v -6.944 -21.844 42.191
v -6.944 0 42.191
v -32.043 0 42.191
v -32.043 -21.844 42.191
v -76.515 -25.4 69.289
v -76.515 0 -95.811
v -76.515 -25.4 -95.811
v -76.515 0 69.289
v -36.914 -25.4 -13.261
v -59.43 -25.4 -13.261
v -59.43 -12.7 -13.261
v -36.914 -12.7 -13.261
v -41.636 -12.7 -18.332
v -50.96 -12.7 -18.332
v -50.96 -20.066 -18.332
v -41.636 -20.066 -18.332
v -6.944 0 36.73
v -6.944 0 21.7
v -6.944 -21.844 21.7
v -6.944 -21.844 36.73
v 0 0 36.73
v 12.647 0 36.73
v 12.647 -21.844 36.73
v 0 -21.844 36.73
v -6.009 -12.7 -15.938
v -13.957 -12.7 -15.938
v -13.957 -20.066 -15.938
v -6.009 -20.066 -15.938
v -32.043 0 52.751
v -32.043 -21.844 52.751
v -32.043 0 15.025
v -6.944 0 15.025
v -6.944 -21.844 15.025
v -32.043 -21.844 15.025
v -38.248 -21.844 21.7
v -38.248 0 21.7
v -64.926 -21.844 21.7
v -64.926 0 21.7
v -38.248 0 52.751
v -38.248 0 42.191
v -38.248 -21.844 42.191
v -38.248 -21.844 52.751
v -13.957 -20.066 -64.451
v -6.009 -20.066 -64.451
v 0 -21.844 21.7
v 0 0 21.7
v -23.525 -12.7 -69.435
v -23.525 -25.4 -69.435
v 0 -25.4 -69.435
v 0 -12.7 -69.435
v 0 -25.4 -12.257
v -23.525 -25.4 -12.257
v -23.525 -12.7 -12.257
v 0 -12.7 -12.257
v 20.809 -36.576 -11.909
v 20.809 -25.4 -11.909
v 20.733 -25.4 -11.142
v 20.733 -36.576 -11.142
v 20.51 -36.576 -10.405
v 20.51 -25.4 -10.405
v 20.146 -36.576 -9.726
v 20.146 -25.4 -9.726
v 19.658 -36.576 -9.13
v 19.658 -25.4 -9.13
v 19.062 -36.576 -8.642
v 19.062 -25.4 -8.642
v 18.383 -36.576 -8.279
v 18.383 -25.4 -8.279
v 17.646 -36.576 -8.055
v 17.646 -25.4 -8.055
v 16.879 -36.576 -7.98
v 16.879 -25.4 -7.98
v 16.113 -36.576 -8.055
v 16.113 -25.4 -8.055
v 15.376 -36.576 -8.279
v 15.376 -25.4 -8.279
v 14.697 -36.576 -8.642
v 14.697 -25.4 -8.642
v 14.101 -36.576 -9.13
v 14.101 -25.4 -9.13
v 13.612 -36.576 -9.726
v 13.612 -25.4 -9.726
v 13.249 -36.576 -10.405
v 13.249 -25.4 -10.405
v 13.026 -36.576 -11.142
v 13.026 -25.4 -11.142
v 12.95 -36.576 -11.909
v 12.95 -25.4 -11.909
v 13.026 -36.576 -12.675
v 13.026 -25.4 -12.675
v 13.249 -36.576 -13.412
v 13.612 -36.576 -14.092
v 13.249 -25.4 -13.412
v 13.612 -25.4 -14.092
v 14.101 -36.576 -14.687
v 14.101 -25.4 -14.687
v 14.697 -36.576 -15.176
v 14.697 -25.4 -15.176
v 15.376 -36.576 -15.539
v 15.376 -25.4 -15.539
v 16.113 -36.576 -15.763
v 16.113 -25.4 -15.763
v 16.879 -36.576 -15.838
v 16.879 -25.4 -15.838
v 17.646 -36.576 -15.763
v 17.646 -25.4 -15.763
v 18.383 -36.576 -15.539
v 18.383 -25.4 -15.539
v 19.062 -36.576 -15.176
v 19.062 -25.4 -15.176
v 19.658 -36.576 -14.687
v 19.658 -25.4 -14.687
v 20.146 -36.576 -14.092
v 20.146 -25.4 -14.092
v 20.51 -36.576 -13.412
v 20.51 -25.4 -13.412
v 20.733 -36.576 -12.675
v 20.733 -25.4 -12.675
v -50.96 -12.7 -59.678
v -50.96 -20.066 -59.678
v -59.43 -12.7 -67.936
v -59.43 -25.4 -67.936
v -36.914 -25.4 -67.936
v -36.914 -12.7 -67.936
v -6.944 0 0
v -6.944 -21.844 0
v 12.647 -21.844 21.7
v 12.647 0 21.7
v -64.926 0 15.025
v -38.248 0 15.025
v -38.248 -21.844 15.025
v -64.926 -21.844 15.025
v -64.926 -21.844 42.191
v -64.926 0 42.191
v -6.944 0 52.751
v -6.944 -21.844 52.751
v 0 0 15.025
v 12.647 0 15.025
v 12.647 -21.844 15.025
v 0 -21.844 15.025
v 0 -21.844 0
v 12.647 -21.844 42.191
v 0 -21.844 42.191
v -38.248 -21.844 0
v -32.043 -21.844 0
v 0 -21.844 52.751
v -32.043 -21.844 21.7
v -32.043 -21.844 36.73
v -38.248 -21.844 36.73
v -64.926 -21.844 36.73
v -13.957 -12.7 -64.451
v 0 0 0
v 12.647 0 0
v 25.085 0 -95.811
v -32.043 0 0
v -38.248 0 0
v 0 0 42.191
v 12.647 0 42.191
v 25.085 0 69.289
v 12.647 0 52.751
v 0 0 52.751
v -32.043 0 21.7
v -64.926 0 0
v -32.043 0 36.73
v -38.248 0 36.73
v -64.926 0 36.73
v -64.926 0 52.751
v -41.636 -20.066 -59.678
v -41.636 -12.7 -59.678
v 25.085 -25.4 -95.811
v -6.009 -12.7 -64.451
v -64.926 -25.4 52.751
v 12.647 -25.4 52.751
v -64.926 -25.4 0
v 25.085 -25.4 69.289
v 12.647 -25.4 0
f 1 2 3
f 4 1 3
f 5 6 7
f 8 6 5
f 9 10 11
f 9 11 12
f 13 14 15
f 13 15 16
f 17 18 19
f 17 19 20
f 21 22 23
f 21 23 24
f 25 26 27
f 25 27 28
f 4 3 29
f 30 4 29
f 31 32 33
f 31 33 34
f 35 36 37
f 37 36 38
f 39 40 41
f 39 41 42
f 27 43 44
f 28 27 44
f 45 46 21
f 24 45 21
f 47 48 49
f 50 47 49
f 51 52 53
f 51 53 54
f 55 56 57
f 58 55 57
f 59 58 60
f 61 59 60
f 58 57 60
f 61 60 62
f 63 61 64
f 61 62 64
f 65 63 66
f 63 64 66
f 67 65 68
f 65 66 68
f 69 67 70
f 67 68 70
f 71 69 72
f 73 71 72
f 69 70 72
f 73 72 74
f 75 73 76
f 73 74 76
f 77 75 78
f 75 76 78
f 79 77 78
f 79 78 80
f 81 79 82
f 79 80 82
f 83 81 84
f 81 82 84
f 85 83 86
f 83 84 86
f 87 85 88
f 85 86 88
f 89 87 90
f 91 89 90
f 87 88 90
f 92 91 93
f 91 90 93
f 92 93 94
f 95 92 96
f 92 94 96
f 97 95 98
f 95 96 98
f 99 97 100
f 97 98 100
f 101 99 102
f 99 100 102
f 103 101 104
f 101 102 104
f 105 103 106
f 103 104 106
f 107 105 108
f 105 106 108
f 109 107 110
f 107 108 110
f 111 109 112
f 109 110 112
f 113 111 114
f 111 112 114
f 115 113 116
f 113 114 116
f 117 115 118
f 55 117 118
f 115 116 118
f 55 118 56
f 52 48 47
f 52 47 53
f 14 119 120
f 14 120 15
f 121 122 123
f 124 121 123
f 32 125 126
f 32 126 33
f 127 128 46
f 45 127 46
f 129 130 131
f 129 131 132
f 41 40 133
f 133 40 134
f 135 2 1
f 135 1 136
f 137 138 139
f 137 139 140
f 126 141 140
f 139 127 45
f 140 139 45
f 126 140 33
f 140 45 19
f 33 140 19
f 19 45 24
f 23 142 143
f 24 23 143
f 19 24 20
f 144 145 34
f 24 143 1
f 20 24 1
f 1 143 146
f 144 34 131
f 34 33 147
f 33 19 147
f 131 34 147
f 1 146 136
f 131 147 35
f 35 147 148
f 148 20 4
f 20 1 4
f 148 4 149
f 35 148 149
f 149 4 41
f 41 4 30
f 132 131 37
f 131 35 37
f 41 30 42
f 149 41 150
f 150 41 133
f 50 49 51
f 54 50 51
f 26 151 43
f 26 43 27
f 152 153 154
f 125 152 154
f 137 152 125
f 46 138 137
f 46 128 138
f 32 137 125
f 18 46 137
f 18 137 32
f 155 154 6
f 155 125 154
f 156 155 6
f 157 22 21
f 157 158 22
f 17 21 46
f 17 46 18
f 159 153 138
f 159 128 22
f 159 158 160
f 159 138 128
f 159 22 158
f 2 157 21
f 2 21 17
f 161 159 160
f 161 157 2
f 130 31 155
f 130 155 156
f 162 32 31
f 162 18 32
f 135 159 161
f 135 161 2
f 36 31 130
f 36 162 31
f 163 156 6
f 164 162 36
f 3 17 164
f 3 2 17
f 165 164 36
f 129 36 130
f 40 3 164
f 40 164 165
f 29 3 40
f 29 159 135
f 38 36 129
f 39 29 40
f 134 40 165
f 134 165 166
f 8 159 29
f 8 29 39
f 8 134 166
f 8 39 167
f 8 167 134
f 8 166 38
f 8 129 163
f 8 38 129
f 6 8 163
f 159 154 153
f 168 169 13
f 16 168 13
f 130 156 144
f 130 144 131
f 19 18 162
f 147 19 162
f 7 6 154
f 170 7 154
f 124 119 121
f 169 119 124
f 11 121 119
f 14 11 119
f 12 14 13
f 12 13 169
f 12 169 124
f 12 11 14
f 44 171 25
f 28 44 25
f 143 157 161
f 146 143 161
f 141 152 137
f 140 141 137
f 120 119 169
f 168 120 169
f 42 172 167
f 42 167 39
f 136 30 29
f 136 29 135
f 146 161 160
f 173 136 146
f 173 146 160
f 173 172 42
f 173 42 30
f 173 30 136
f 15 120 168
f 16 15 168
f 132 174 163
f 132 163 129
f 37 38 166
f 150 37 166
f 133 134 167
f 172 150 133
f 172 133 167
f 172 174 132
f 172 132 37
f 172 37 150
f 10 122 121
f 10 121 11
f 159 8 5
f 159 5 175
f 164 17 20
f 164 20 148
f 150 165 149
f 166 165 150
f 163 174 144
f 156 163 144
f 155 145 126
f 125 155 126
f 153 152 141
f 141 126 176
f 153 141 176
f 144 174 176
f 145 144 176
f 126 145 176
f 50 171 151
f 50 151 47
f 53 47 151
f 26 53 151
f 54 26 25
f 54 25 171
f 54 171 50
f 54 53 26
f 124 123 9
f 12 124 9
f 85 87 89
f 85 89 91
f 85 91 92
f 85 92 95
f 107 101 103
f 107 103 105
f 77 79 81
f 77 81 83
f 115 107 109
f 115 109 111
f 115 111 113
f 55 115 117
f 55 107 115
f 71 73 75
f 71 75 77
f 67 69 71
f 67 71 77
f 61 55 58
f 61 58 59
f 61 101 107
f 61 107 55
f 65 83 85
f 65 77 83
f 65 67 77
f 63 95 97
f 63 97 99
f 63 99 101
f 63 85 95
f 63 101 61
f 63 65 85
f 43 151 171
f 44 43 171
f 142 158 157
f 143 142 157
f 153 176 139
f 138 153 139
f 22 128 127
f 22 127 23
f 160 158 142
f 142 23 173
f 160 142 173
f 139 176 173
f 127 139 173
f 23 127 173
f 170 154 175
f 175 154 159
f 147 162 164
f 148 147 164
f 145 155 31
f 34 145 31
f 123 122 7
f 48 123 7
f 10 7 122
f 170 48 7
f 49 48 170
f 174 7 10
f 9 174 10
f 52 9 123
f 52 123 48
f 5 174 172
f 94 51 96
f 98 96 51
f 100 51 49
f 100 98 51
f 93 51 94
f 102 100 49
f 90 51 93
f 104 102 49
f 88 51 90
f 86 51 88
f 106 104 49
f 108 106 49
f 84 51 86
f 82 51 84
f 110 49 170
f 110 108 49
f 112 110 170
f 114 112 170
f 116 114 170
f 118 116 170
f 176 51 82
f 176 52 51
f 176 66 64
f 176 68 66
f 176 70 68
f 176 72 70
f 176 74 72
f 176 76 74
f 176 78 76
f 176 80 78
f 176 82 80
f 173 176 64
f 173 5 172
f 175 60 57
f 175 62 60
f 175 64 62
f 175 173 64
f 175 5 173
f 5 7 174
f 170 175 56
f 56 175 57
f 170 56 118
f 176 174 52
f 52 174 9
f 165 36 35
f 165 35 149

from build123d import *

# Parameters (mm, degrees)
F0_W      = 101.6
F0_H      = 165.1
F1_DEPTH  = 25.4
F2_W      = 77.5733087212
F2_H      = 52.7514182031
F3_DEPTH  = 61.976
F4_W      = 15.6093118712
F4_H      = 5.4604299366
F4_W_2    = 6.9440016523
F4_H_2    = 14.854170382
F4_W_3    = 25.0991685316
F4_H_3    = 15.0301940739
F4_W_4    = 6.2049590051
F4_H_4    = 14.403630048
F4_H_5    = 6.6751083359
F4_W_5    = 30.088968575
F4_H_6    = 21.6047465801
F4_H_7    = 20.752211567
F5_DEPTH  = 21.844
F6_W      = 22.5156284869
F6_H      = 54.6749219446
F6_W_2    = 23.5249437392
F6_H_2    = 57.1776889265
F7_DEPTH  = 12.7
F8_W      = 9.3237310648
F8_H      = 41.3462072611
F8_W_2    = 7.9486728646
F8_H_2    = 48.5131144524
F9_DEPTH  = 7.366
F10_R     = 3.9292089133
F11_DEPTH = 11.176


with BuildPart() as f1:
    # F0 (on Front) → F1 (new body)
    with BuildSketch(Plane.XZ):
        with Locations((-25.7154209539, -13.2609471531)):
            Rectangle(F0_W, F0_H)
    extrude(amount=F1_DEPTH)

    # F2 (on face) → F3 (cut)
    with BuildSketch(Plane.XZ.offset(25.4)):
        with Locations((-26.1394409463, 26.3757091016)):
            Rectangle(F2_W, F2_H)
    extrude(amount=-F3_DEPTH, mode=Mode.SUBTRACT)

    # F4 (on face) → F5 (join)
    with BuildSketch(Plane(origin=(0, 0, 0), x_dir=(-1, 0, 0), z_dir=(0, 1, 0))):
        with Locations((-7.8046559356, 39.4605305046)):
            Rectangle(F4_W, F4_H)
        with Locations((3.4720008262, 49.6178306639)):
            Rectangle(F4_W_2, F4_H_2)
        with Locations((3.4720008262, 39.4605305046)):
            Rectangle(F4_W_2, F4_H)
        with Locations((19.4935859181, 39.4605305046)):
            Rectangle(F4_W_3, F4_H)
        with Locations((3.4720008262, 29.2152184993)):
            Rectangle(F4_W_2, F4_H_3)
        with Locations((35.1456496865, 49.3925604969)):
            Rectangle(F4_W_4, F4_H_4)
        with Locations((35.1456496865, 39.4605305046)):
            Rectangle(F4_W_4, F4_H)
        with Locations((-7.8046559356, 18.3625672944)):
            Rectangle(F4_W, F4_H_5)
        with Locations((3.4720008262, 18.3625672944)):
            Rectangle(F4_W_2, F4_H_5)
        with Locations((53.2926134765, 39.4605305046)):
            Rectangle(F4_W_5, F4_H)
        with Locations((35.1456496865, 29.2152184993)):
            Rectangle(F4_W_4, F4_H_3)
        with Locations((19.4935859181, 18.3625672944)):
            Rectangle(F4_W_3, F4_H_5)
        with Locations((3.4720008262, 4.2226398364)):
            Rectangle(F4_W_2, F4_H_6)
        with Locations((35.1456496865, 18.3625672944)):
            Rectangle(F4_W_4, F4_H_5)
        with Locations((53.2926134765, 18.3625672944)):
            Rectangle(F4_W_5, F4_H_5)
        with Locations((35.1456496865, 4.6489073429)):
            Rectangle(F4_W_4, F4_H_7)
    extrude(amount=-F5_DEPTH)

    # F6 (on face) → F7 (cut)
    with BuildSketch(Plane.XZ.offset(25.4)):
        with Locations((-48.1722448021, -40.5984081254)):
            Rectangle(F6_W, F6_H)
        with Locations((-11.7624718696, -40.8460963517)):
            Rectangle(F6_W_2, F6_H_2)
    extrude(amount=-F7_DEPTH, mode=Mode.SUBTRACT)

    # F8 (on face) → F9 (join)
    with BuildSketch(Plane.XZ.offset(12.7)):
        with Locations((-46.2979972363, -39.0051342547)):
            Rectangle(F8_W, F8_H)
        with Locations((-9.9831267726, -40.1948392391)):
            Rectangle(F8_W_2, F8_H_2)
    extrude(amount=F9_DEPTH)

    # F10 (on face) → F11 (join)
    with BuildSketch(Plane.XZ.offset(25.4)):
        with Locations((16.8794579804, -11.9087984785)):
            Circle(F10_R)
    extrude(amount=F11_DEPTH)


solid = f1.part
